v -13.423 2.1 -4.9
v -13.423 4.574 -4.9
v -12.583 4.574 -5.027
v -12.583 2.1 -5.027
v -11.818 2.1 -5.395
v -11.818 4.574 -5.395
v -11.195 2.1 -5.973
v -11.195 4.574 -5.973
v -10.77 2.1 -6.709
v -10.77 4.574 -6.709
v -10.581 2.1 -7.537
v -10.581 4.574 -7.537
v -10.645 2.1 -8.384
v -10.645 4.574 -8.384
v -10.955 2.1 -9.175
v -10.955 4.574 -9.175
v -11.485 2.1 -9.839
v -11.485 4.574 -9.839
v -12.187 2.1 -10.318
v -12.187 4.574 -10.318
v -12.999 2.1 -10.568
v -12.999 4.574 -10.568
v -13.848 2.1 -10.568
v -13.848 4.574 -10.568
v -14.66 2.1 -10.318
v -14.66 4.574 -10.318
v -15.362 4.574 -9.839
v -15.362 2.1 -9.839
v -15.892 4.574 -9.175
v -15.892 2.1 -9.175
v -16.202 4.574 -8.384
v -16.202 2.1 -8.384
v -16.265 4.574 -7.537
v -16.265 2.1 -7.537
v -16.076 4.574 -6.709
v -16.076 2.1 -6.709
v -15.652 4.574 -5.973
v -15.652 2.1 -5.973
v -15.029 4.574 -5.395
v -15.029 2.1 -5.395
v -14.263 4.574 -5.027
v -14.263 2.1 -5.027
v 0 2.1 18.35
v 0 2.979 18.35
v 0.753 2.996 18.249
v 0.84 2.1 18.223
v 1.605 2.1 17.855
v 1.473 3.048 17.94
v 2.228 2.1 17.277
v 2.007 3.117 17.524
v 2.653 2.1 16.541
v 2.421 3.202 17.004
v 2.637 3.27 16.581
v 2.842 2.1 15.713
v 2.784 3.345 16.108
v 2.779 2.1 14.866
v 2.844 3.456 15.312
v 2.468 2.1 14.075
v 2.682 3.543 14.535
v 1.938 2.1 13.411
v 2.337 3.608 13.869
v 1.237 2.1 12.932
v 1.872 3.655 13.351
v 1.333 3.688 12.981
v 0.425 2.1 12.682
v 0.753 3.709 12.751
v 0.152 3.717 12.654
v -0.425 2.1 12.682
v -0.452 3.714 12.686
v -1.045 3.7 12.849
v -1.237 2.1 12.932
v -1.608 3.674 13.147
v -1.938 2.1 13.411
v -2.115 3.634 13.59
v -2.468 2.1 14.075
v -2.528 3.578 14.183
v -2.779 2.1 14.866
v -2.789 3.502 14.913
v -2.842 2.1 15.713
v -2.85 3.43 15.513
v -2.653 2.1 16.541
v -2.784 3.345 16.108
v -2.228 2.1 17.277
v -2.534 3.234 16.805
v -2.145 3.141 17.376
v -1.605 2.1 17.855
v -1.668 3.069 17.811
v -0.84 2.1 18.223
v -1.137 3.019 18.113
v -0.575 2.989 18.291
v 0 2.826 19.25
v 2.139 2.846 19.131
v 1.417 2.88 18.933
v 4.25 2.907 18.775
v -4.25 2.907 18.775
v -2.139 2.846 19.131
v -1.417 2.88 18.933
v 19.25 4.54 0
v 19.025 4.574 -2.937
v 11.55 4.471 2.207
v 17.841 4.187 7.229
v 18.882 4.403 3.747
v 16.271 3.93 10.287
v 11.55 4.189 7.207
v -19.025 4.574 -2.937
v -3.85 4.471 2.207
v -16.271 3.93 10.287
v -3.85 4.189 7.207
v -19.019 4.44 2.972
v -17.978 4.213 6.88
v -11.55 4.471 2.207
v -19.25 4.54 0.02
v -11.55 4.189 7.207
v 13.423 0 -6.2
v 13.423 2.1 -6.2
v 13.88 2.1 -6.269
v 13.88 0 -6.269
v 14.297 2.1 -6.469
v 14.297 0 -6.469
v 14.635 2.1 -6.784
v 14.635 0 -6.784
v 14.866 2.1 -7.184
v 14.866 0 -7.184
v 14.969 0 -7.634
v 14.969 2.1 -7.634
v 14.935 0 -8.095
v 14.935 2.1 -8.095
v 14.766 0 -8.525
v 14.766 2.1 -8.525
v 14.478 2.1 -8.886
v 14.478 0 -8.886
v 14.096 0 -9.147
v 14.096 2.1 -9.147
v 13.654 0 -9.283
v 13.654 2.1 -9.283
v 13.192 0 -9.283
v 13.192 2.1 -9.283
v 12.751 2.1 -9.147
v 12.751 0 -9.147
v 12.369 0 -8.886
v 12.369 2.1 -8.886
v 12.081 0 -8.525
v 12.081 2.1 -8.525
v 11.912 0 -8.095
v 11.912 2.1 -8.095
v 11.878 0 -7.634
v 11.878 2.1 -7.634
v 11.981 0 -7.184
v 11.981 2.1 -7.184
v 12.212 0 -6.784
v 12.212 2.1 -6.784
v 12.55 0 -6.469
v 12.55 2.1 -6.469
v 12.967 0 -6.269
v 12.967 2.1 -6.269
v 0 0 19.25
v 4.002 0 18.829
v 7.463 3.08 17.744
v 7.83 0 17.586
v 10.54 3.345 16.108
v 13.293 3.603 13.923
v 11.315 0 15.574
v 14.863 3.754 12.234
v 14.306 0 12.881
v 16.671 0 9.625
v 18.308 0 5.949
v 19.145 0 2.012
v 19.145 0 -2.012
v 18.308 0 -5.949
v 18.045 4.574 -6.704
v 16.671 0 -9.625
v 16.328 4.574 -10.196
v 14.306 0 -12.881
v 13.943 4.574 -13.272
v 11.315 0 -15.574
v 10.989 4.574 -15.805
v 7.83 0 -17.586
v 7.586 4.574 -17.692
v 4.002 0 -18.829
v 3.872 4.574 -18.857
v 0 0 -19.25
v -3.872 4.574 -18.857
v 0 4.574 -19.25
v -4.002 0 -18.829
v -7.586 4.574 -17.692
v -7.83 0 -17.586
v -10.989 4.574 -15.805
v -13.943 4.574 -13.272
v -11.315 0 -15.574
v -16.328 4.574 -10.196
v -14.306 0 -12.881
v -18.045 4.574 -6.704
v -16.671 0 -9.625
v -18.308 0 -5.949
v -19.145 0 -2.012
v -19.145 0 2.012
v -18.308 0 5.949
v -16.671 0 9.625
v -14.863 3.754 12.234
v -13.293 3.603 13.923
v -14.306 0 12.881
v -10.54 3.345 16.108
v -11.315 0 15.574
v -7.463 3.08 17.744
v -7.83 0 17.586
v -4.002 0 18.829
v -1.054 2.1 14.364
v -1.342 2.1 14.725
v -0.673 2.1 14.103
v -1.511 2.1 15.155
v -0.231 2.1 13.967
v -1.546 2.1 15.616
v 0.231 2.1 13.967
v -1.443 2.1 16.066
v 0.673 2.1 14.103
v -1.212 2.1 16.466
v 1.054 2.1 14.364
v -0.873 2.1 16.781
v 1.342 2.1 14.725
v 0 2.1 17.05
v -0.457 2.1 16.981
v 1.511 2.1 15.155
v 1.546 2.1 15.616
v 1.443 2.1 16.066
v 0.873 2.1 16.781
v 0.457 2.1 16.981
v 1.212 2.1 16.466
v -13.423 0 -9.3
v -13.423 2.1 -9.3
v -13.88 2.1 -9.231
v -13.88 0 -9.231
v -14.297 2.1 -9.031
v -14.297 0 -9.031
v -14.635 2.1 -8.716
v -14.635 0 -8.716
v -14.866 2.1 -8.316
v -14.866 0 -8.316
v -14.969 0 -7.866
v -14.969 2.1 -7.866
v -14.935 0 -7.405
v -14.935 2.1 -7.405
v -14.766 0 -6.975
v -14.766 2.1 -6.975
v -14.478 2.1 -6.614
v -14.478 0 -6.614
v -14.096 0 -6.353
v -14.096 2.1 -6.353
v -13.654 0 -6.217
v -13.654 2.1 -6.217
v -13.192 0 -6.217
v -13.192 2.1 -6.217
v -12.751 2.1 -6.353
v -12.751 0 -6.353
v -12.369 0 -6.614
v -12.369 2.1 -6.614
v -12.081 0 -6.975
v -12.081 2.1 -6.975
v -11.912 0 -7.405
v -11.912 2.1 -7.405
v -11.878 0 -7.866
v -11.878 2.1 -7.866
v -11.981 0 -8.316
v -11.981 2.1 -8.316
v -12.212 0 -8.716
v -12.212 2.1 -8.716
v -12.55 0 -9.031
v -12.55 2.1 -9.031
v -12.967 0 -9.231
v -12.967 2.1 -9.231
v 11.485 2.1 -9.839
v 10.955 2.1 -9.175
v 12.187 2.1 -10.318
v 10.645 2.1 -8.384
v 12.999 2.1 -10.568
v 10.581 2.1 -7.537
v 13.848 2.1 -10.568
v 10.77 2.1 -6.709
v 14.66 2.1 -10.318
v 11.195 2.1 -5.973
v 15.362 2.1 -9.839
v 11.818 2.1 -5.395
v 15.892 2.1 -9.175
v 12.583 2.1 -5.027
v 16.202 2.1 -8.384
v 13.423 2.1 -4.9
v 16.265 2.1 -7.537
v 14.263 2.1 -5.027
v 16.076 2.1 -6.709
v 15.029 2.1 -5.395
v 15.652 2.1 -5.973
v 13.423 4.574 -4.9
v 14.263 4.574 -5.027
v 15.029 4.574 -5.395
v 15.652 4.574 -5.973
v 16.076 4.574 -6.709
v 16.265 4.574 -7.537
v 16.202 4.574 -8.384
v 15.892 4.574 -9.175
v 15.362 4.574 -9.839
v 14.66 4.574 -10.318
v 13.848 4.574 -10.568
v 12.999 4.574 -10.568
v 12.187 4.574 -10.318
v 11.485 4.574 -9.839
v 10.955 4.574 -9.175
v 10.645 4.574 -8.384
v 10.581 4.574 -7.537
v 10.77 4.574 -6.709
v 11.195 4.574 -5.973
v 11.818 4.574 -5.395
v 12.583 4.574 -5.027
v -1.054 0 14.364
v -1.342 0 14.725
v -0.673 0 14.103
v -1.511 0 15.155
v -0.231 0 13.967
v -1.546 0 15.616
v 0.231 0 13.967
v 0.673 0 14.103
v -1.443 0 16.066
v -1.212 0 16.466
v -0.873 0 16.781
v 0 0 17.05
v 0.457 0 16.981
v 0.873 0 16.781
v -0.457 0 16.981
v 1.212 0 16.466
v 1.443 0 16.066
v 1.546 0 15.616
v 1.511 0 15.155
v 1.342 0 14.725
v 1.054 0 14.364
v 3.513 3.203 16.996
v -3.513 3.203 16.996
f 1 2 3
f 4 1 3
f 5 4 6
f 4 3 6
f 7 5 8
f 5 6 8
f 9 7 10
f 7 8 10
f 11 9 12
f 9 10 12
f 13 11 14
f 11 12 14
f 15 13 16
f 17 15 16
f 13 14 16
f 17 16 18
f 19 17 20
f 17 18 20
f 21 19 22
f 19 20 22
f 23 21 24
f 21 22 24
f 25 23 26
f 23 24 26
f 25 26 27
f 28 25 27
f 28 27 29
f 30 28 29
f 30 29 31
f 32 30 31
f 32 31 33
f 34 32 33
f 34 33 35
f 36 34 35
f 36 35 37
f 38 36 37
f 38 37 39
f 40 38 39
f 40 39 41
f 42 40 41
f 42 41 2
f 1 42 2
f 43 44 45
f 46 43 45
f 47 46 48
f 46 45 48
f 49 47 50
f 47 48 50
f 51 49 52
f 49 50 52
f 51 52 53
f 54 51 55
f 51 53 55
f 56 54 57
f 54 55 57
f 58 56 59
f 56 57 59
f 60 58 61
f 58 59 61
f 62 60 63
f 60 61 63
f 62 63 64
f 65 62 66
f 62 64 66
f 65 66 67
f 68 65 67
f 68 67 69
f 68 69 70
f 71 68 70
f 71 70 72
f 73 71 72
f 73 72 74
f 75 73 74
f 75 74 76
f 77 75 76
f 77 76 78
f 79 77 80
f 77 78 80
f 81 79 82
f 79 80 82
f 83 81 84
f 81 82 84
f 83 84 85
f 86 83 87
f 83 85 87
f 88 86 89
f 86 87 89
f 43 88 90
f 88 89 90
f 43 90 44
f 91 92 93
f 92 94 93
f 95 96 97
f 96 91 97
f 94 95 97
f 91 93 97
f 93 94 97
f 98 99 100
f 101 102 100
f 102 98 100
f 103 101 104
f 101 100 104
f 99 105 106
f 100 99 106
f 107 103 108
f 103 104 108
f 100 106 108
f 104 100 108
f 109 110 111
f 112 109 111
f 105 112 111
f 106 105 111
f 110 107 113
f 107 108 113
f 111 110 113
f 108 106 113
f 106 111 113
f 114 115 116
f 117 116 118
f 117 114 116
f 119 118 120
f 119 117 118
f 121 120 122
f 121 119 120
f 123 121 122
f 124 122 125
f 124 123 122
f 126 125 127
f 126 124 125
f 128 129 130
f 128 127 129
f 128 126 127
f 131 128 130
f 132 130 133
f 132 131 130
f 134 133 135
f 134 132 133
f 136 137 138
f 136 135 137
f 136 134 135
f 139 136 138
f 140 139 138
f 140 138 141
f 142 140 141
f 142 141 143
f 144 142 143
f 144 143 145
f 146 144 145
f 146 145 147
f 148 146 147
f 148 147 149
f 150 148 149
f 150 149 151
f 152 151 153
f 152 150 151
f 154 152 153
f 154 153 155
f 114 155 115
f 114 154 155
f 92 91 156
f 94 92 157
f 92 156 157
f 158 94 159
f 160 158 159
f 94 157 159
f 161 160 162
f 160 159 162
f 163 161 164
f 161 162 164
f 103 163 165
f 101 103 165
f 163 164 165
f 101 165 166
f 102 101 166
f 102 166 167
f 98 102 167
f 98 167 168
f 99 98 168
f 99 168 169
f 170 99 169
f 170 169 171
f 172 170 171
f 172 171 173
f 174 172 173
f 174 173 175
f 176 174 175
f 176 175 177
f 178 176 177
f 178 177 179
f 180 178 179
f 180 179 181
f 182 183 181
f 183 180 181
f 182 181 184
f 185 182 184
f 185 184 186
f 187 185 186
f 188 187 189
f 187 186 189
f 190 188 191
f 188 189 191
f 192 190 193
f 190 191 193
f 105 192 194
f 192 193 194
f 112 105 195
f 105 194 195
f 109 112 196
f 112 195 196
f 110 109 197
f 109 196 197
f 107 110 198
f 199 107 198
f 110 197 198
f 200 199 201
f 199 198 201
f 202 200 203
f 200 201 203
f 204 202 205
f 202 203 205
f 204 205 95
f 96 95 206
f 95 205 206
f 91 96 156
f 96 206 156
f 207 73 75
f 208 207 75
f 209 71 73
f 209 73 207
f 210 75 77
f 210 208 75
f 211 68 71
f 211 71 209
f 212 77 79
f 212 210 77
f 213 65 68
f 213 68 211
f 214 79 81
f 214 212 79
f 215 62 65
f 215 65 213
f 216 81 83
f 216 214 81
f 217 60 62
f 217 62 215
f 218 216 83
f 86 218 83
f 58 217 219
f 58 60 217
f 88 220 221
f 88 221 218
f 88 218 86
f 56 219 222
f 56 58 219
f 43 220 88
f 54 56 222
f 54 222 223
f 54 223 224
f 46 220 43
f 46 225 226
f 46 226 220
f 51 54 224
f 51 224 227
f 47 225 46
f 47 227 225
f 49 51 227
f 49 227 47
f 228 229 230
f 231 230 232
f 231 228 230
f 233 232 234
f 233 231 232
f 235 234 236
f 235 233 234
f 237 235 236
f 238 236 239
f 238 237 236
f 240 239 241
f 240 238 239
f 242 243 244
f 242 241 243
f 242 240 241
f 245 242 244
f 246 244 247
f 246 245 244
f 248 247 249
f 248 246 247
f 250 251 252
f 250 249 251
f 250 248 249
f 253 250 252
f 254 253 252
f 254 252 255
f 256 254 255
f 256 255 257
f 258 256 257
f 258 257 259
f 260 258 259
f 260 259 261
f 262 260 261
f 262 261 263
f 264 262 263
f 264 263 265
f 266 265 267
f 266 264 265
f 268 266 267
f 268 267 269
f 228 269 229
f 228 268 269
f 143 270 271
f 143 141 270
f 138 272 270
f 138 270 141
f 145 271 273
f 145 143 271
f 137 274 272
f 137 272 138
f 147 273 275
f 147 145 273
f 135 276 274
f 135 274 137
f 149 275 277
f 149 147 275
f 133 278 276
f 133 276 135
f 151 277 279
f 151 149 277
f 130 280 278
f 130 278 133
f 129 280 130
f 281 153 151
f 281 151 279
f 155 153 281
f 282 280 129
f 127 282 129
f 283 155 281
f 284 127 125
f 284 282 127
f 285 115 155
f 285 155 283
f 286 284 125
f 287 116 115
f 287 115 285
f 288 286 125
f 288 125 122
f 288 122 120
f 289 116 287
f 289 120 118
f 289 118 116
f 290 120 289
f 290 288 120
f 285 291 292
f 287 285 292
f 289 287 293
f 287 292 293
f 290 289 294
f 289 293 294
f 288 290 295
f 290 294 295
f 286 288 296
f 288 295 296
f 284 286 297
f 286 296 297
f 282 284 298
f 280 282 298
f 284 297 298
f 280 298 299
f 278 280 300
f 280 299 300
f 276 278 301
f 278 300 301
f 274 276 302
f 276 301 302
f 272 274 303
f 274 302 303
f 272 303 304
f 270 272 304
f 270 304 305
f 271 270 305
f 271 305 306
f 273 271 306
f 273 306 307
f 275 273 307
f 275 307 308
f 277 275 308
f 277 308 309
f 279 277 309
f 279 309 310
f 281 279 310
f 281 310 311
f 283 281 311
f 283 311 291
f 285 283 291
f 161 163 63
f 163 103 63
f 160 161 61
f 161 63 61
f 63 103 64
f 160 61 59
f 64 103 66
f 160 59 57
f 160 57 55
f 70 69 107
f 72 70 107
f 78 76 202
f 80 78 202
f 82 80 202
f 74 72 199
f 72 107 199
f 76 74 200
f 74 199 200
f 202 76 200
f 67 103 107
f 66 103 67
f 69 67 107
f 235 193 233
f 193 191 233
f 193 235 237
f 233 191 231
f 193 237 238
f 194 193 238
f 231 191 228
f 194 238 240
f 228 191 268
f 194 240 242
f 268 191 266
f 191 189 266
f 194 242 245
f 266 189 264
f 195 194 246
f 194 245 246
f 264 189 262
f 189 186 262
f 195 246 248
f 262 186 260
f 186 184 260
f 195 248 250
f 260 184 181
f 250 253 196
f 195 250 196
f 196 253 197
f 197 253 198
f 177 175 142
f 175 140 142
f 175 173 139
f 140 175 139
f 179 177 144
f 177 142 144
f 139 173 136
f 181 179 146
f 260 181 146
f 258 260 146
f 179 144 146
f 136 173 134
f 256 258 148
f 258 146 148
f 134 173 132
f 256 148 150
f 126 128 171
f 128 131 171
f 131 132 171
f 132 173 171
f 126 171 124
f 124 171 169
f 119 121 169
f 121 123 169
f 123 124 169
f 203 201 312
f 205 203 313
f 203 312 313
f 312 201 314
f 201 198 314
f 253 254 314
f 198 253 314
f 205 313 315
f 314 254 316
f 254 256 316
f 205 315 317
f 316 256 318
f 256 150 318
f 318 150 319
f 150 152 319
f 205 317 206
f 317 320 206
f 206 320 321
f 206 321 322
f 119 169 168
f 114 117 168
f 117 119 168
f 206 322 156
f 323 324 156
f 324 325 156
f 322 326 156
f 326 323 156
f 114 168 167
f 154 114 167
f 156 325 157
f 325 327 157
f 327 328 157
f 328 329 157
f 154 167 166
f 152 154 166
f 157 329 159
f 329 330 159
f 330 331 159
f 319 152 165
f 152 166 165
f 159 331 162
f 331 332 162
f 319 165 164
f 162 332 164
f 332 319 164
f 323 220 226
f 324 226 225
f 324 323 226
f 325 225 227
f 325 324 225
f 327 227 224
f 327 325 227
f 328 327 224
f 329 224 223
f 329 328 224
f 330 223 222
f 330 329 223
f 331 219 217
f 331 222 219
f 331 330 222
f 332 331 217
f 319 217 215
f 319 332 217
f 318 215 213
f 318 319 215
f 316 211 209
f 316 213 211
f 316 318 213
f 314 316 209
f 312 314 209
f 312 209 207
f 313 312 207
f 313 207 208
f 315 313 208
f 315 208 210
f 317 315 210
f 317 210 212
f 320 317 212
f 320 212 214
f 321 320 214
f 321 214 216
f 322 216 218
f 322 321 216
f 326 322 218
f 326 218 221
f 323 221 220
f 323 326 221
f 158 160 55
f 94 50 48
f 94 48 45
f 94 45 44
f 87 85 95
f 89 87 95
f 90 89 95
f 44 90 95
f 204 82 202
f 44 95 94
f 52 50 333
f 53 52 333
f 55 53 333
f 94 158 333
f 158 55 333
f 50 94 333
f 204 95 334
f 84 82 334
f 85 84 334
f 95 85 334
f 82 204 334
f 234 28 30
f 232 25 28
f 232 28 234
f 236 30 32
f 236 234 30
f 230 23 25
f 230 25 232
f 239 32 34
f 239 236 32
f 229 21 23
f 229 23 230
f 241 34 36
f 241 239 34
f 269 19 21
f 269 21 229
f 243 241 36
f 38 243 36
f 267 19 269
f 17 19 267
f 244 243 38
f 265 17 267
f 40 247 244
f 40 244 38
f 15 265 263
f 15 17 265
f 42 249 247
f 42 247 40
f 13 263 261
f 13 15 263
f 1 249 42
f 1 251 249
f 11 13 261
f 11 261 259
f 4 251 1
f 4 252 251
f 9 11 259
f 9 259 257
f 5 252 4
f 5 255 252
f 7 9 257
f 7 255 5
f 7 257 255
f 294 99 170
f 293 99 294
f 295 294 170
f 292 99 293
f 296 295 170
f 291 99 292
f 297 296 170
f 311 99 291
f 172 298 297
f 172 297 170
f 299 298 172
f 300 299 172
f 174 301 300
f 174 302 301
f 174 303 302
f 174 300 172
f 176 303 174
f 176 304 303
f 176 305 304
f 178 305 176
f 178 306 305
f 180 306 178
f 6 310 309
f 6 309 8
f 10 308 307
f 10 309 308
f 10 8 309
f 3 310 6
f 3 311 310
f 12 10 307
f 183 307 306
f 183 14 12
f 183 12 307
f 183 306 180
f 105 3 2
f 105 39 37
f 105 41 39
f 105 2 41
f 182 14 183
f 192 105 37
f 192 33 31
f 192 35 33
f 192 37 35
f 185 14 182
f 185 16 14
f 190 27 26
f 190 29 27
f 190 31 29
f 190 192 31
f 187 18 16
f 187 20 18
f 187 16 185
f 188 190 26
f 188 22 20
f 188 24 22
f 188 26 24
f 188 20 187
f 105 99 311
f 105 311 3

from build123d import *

# Parameters (mm, degrees)
CROQUIS1_R              = 19.25
CROQUIS1_R_2            = 1.55
SALIENTE_EXTRUIR1_DEPTH = 4.6
CROQUIS2_R              = 2.85
CORTAR_EXTRUIR1_DEPTH   = 2.5
CORTAR_EXTRUIR2_START   = -20
CORTAR_EXTRUIR2_DEPTH   = 39.25


with BuildPart() as part:
    # Croquis1 → Saliente-Extruir1 (new body)
    with BuildSketch(Plane(origin=(0, 0, 0), x_dir=(1, 0, 0), z_dir=(0, 1, 0))):
        with Locations(Location((0, 0, 0), (0, 0, 270))):
            Circle(CROQUIS1_R)
        with Locations(Location((0, -15.5, 0), (0, 0, 270))):
            Circle(CROQUIS1_R_2, mode=Mode.SUBTRACT)
        with Locations(Location((13.423393759, 7.75, 0), (0, 0, 270))):
            Circle(CROQUIS1_R_2, mode=Mode.SUBTRACT)
        with Locations(Location((-13.423393759, 7.75, 0), (0, 0, 90))):
            Circle(CROQUIS1_R_2, mode=Mode.SUBTRACT)
    extrude(amount=SALIENTE_EXTRUIR1_DEPTH)

    # Croquis2 → Cortar-Extruir1 (cut)
    with BuildSketch(Plane(origin=(0, 4.6, 0), x_dir=(1, 0, 0), z_dir=(0, 1, 0))):
        with Locations(Location((-13.423393759, 7.75, 0), (0, 0, 270))):
            Circle(CROQUIS2_R)
        with Locations(Location((0, -15.5, 0), (0, 0, 270))):
            Circle(CROQUIS2_R)
        with Locations(Location((13.423393759, 7.75, 0), (0, 0, 270))):
            Circle(CROQUIS2_R)
    extrude(amount=-CORTAR_EXTRUIR1_DEPTH, mode=Mode.SUBTRACT)

    # Cortar-Extruir2: read off the stored shape, not the designer's step
    # Cortar-Extruir2 outline → Cortar-Extruir2 (cut)
    with BuildSketch(Plane(origin=(0, 0, 0), x_dir=(0, 0, -1), z_dir=(1, 0, 0)).offset(CORTAR_EXTRUIR2_START)):
        with BuildLine():
            add(Edge.make_bspline(
                [(2.936977636, 4.574175621), (1.790244303, 4.574175621), (0.64594889, 4.558108358), (-1.067035866, 4.512526979), (-1.637451159, 4.493737954), (-2.777118659, 4.449256149), (-3.347978215, 4.423479493), (-5.04815673, 4.33666012), (-6.144965171, 4.267295894), (-8.268827136, 4.110803555), (-9.295878077, 4.023634192), (-10.286640587, 3.929863966)],
                knots=[0, 0, 0, 0, 0.25, 0.25, 0.375, 0.375, 0.5, 0.5, 0.75, 0.75, 1, 1, 1, 1], degree=3))
            Line((2.936977636, 4.574175621), (19.25, 4.574175621))
            Line((19.25, 4.574175621), (20, 4.574175621))
            Line((20, 4.574175621), (20, 28.682505432))
            Line((20, 28.682505432), (9.143406809, 28.682505432))
            add(Edge.make_bspline(
                [(9.143406809, 28.682505432), (0.711546133, 17.325043273), (-7.611623296, 9.681788834), (-15.859834912, 4.6)],
                knots=[-1.666266403, -1.666266403, -1.666266403, -1.666266403, -0.863138153, -0.863138153, -0.863138153, -0.863138153], degree=3))
            add(Edge.make_bspline(
                [(-15.859834912, 4.6), (-16.832562085, 4.000695046), (-17.80424675, 3.437014777), (-18.774944235, 2.907068479)],
                knots=[-0.863138153, -0.863138153, -0.863138153, -0.863138153, -0.768423721, -0.768423721, -0.768423721, -0.768423721], degree=3))
            add(Edge.make_bspline(
                [(-16.107826284, 3.345164552), (-16.996272574, 3.2049165), (-17.885328598, 3.058510171), (-18.774944235, 2.907068479)],
                knots=[0.576630654, 0.576630654, 0.576630654, 0.576630654, 0.604116223, 0.604116223, 0.604116223, 0.604116223], degree=3))
            add(Edge.make_bspline(
                [(-10.286640587, 3.929863966), (-11.433287768, 3.821340113), (-12.490092354, 3.733147685), (-14.431499601, 3.557604756), (-15.316034761, 3.47015491), (-16.107826284, 3.345164552)],
                knots=[0, 0, 0, 0, 0.5, 0.5, 1, 1, 1, 1], degree=3))
        make_face()
        with BuildLine():
            add(Edge.make_bspline(
                [(-18.774944235, 2.907068479), (-18.933464547, 2.880083135), (-19.092002628, 2.85293791), (-19.250558194, 2.825639157)],
                knots=[0.604116223, 0.604116223, 0.604116223, 0.604116223, 0.609013868, 0.609013868, 0.609013868, 0.609013868], degree=3))
            add(Edge.make_bspline(
                [(-15.859834912, 4.6), (-16.832562085, 4.000695046), (-17.80424675, 3.437014777), (-18.774944235, 2.907068479)],
                knots=[-0.863138153, -0.863138153, -0.863138153, -0.863138153, -0.768423721, -0.768423721, -0.768423721, -0.768423721], degree=3))
            add(Edge.make_bspline(
                [(9.143406809, 28.682505432), (0.711546133, 17.325043273), (-7.611623296, 9.681788834), (-15.859834912, 4.6)],
                knots=[-1.666266403, -1.666266403, -1.666266403, -1.666266403, -0.863138153, -0.863138153, -0.863138153, -0.863138153], degree=3))
            Line((9.143406809, 28.682505432), (-19.854758161, 28.682505432))
            Line((-19.854758161, 28.682505432), (-19.854758161, 2.720897695))
            add(Edge.make_bspline(
                [(-19.250558194, 2.825639157), (-19.451930173, 2.790968638), (-19.653330356, 2.756050479), (-19.854758161, 2.720897695)],
                knots=[0.609013868, 0.609013868, 0.609013868, 0.609013868, 0.615234074, 0.615234074, 0.615234074, 0.615234074], degree=3))
        make_face()
    extrude(amount=CORTAR_EXTRUIR2_DEPTH, mode=Mode.SUBTRACT)


solid = part.part
